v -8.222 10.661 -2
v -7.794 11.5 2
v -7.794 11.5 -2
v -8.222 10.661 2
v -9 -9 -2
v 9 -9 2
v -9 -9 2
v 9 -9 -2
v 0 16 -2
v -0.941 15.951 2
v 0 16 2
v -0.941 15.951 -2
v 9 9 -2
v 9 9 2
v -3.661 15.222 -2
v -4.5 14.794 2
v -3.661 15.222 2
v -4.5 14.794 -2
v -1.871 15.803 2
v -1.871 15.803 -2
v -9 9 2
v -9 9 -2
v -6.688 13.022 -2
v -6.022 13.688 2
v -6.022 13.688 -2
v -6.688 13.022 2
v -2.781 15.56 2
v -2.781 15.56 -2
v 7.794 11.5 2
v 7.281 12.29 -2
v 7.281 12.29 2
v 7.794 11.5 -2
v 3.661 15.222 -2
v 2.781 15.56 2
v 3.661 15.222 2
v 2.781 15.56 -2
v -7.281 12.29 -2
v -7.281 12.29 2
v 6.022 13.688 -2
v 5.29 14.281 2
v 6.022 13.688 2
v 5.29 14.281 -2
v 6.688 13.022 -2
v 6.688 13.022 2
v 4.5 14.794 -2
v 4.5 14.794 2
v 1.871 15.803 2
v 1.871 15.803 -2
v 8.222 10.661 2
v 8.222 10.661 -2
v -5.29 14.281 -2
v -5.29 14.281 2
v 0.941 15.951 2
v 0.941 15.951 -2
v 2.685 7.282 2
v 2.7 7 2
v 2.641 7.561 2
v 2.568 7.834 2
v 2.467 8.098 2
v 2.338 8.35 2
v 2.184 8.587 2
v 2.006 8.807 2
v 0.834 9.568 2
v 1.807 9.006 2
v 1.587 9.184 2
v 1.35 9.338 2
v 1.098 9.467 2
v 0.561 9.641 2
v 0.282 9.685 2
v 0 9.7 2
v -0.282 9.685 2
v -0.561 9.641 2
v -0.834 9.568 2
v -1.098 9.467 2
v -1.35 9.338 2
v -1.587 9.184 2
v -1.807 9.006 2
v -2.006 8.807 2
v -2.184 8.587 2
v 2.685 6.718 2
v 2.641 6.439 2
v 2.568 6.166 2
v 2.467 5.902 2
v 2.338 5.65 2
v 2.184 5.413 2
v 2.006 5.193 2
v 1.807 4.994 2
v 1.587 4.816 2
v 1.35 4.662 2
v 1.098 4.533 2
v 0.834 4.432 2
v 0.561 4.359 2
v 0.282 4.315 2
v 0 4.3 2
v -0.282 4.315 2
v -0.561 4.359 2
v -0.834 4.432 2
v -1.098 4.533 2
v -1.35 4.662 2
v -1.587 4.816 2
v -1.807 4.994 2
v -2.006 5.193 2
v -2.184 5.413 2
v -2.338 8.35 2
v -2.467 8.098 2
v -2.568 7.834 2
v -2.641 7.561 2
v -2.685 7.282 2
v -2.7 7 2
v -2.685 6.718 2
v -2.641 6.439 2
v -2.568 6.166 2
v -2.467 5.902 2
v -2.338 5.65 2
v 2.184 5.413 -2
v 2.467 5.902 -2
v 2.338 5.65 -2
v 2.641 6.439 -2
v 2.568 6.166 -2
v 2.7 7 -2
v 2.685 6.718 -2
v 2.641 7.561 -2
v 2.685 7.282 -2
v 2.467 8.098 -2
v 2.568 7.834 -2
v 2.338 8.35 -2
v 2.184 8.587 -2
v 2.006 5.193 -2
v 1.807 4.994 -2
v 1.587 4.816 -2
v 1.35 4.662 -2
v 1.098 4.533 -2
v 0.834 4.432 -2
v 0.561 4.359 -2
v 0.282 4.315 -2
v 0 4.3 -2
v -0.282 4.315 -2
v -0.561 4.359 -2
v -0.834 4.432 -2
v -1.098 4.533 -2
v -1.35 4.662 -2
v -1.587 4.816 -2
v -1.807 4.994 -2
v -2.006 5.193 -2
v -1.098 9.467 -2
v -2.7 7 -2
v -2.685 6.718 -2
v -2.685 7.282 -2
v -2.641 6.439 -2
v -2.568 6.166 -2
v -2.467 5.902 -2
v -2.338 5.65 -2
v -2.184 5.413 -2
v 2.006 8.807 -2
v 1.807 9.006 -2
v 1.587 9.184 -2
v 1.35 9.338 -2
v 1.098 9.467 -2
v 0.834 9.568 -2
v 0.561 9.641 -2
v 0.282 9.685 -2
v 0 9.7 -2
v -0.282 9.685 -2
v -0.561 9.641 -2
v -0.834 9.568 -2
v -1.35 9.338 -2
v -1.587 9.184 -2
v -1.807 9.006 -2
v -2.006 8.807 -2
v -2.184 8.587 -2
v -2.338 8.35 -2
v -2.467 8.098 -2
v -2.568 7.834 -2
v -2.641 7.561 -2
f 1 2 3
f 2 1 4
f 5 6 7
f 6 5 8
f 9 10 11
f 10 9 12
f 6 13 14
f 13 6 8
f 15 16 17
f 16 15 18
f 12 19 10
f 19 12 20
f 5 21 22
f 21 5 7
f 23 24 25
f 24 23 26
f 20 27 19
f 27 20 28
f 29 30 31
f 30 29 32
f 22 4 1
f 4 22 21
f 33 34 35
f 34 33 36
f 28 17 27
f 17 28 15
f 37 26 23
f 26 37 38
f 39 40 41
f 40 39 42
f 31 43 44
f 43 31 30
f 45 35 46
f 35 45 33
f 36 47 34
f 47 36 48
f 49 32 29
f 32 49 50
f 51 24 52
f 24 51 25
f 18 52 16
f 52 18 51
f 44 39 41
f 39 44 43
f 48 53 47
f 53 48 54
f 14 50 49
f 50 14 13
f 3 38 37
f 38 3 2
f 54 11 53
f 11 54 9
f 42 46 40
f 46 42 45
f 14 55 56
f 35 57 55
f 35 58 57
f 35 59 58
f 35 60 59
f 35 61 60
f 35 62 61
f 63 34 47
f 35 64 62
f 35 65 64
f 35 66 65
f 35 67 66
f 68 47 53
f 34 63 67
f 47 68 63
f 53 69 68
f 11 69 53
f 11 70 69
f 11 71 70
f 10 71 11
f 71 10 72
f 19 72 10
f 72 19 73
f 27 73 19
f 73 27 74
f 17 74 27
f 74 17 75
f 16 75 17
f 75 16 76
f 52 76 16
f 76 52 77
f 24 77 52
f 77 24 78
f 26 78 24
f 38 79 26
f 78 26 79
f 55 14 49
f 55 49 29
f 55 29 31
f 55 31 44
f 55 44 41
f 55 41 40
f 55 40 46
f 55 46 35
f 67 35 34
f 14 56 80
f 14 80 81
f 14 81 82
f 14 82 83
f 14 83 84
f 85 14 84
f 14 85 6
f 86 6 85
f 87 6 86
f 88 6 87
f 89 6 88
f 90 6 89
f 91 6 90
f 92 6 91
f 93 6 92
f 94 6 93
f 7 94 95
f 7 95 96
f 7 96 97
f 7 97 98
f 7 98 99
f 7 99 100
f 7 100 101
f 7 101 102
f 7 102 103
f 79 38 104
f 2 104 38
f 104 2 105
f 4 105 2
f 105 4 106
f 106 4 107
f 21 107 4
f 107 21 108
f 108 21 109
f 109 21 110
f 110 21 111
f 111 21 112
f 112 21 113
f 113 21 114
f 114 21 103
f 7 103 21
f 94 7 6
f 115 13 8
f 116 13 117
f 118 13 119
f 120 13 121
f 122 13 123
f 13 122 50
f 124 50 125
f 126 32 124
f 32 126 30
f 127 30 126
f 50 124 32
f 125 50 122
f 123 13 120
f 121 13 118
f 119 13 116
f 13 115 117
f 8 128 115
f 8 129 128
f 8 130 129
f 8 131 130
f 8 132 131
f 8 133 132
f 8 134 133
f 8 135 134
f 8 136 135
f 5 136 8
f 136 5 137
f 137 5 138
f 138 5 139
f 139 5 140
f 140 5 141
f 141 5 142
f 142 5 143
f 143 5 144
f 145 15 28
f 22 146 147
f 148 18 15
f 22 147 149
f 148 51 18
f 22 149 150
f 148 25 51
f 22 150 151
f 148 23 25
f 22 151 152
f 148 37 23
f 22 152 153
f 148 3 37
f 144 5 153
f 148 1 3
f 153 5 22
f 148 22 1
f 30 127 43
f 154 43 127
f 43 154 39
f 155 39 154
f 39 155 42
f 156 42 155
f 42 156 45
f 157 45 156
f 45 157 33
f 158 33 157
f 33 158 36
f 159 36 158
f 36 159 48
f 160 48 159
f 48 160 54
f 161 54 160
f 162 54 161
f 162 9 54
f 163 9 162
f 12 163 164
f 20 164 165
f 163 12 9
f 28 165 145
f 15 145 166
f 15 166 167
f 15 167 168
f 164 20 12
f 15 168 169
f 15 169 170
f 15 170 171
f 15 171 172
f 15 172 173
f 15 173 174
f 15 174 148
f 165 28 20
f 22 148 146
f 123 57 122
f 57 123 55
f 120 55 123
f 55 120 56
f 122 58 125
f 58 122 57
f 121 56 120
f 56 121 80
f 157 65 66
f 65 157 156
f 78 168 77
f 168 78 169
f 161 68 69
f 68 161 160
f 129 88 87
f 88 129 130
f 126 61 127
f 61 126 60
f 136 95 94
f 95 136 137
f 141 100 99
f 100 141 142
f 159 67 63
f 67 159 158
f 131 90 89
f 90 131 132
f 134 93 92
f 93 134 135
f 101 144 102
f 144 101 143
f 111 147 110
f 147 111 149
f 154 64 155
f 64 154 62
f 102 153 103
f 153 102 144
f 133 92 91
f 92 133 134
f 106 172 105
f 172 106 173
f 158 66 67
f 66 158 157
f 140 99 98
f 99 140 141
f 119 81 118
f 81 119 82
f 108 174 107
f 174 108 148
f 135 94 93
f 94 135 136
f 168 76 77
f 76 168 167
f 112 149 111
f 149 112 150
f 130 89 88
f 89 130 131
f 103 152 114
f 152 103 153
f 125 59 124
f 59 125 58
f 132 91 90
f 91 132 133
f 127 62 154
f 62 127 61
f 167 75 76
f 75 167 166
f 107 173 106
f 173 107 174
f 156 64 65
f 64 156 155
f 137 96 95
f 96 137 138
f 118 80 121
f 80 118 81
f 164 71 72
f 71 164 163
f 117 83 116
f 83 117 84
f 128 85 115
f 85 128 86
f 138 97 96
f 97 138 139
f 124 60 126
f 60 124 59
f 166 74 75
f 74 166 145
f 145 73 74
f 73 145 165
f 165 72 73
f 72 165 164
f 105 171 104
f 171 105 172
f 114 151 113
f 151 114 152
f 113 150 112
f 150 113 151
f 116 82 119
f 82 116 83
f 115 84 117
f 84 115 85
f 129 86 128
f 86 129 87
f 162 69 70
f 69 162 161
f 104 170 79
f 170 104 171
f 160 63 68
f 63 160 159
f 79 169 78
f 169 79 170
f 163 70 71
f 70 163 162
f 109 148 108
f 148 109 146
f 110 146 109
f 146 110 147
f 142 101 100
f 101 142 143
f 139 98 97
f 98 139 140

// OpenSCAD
// Single-hole mounting tab.
$fn = 60;
eps = 0.02;
tab_w = 18;
tab_h = 32;
tab_t = 4;
difference() {
    hull() { translate([0,0,0]) cube([tab_w,tab_w,tab_t],center=true); translate([0,tab_h/2-tab_w/2,0]) cylinder(d=tab_w,h=tab_t,center=true); }
    translate([0,tab_h/2-tab_w/2,-tab_t/2-eps]) cylinder(d=5.4,h=tab_t+2*eps);
}
